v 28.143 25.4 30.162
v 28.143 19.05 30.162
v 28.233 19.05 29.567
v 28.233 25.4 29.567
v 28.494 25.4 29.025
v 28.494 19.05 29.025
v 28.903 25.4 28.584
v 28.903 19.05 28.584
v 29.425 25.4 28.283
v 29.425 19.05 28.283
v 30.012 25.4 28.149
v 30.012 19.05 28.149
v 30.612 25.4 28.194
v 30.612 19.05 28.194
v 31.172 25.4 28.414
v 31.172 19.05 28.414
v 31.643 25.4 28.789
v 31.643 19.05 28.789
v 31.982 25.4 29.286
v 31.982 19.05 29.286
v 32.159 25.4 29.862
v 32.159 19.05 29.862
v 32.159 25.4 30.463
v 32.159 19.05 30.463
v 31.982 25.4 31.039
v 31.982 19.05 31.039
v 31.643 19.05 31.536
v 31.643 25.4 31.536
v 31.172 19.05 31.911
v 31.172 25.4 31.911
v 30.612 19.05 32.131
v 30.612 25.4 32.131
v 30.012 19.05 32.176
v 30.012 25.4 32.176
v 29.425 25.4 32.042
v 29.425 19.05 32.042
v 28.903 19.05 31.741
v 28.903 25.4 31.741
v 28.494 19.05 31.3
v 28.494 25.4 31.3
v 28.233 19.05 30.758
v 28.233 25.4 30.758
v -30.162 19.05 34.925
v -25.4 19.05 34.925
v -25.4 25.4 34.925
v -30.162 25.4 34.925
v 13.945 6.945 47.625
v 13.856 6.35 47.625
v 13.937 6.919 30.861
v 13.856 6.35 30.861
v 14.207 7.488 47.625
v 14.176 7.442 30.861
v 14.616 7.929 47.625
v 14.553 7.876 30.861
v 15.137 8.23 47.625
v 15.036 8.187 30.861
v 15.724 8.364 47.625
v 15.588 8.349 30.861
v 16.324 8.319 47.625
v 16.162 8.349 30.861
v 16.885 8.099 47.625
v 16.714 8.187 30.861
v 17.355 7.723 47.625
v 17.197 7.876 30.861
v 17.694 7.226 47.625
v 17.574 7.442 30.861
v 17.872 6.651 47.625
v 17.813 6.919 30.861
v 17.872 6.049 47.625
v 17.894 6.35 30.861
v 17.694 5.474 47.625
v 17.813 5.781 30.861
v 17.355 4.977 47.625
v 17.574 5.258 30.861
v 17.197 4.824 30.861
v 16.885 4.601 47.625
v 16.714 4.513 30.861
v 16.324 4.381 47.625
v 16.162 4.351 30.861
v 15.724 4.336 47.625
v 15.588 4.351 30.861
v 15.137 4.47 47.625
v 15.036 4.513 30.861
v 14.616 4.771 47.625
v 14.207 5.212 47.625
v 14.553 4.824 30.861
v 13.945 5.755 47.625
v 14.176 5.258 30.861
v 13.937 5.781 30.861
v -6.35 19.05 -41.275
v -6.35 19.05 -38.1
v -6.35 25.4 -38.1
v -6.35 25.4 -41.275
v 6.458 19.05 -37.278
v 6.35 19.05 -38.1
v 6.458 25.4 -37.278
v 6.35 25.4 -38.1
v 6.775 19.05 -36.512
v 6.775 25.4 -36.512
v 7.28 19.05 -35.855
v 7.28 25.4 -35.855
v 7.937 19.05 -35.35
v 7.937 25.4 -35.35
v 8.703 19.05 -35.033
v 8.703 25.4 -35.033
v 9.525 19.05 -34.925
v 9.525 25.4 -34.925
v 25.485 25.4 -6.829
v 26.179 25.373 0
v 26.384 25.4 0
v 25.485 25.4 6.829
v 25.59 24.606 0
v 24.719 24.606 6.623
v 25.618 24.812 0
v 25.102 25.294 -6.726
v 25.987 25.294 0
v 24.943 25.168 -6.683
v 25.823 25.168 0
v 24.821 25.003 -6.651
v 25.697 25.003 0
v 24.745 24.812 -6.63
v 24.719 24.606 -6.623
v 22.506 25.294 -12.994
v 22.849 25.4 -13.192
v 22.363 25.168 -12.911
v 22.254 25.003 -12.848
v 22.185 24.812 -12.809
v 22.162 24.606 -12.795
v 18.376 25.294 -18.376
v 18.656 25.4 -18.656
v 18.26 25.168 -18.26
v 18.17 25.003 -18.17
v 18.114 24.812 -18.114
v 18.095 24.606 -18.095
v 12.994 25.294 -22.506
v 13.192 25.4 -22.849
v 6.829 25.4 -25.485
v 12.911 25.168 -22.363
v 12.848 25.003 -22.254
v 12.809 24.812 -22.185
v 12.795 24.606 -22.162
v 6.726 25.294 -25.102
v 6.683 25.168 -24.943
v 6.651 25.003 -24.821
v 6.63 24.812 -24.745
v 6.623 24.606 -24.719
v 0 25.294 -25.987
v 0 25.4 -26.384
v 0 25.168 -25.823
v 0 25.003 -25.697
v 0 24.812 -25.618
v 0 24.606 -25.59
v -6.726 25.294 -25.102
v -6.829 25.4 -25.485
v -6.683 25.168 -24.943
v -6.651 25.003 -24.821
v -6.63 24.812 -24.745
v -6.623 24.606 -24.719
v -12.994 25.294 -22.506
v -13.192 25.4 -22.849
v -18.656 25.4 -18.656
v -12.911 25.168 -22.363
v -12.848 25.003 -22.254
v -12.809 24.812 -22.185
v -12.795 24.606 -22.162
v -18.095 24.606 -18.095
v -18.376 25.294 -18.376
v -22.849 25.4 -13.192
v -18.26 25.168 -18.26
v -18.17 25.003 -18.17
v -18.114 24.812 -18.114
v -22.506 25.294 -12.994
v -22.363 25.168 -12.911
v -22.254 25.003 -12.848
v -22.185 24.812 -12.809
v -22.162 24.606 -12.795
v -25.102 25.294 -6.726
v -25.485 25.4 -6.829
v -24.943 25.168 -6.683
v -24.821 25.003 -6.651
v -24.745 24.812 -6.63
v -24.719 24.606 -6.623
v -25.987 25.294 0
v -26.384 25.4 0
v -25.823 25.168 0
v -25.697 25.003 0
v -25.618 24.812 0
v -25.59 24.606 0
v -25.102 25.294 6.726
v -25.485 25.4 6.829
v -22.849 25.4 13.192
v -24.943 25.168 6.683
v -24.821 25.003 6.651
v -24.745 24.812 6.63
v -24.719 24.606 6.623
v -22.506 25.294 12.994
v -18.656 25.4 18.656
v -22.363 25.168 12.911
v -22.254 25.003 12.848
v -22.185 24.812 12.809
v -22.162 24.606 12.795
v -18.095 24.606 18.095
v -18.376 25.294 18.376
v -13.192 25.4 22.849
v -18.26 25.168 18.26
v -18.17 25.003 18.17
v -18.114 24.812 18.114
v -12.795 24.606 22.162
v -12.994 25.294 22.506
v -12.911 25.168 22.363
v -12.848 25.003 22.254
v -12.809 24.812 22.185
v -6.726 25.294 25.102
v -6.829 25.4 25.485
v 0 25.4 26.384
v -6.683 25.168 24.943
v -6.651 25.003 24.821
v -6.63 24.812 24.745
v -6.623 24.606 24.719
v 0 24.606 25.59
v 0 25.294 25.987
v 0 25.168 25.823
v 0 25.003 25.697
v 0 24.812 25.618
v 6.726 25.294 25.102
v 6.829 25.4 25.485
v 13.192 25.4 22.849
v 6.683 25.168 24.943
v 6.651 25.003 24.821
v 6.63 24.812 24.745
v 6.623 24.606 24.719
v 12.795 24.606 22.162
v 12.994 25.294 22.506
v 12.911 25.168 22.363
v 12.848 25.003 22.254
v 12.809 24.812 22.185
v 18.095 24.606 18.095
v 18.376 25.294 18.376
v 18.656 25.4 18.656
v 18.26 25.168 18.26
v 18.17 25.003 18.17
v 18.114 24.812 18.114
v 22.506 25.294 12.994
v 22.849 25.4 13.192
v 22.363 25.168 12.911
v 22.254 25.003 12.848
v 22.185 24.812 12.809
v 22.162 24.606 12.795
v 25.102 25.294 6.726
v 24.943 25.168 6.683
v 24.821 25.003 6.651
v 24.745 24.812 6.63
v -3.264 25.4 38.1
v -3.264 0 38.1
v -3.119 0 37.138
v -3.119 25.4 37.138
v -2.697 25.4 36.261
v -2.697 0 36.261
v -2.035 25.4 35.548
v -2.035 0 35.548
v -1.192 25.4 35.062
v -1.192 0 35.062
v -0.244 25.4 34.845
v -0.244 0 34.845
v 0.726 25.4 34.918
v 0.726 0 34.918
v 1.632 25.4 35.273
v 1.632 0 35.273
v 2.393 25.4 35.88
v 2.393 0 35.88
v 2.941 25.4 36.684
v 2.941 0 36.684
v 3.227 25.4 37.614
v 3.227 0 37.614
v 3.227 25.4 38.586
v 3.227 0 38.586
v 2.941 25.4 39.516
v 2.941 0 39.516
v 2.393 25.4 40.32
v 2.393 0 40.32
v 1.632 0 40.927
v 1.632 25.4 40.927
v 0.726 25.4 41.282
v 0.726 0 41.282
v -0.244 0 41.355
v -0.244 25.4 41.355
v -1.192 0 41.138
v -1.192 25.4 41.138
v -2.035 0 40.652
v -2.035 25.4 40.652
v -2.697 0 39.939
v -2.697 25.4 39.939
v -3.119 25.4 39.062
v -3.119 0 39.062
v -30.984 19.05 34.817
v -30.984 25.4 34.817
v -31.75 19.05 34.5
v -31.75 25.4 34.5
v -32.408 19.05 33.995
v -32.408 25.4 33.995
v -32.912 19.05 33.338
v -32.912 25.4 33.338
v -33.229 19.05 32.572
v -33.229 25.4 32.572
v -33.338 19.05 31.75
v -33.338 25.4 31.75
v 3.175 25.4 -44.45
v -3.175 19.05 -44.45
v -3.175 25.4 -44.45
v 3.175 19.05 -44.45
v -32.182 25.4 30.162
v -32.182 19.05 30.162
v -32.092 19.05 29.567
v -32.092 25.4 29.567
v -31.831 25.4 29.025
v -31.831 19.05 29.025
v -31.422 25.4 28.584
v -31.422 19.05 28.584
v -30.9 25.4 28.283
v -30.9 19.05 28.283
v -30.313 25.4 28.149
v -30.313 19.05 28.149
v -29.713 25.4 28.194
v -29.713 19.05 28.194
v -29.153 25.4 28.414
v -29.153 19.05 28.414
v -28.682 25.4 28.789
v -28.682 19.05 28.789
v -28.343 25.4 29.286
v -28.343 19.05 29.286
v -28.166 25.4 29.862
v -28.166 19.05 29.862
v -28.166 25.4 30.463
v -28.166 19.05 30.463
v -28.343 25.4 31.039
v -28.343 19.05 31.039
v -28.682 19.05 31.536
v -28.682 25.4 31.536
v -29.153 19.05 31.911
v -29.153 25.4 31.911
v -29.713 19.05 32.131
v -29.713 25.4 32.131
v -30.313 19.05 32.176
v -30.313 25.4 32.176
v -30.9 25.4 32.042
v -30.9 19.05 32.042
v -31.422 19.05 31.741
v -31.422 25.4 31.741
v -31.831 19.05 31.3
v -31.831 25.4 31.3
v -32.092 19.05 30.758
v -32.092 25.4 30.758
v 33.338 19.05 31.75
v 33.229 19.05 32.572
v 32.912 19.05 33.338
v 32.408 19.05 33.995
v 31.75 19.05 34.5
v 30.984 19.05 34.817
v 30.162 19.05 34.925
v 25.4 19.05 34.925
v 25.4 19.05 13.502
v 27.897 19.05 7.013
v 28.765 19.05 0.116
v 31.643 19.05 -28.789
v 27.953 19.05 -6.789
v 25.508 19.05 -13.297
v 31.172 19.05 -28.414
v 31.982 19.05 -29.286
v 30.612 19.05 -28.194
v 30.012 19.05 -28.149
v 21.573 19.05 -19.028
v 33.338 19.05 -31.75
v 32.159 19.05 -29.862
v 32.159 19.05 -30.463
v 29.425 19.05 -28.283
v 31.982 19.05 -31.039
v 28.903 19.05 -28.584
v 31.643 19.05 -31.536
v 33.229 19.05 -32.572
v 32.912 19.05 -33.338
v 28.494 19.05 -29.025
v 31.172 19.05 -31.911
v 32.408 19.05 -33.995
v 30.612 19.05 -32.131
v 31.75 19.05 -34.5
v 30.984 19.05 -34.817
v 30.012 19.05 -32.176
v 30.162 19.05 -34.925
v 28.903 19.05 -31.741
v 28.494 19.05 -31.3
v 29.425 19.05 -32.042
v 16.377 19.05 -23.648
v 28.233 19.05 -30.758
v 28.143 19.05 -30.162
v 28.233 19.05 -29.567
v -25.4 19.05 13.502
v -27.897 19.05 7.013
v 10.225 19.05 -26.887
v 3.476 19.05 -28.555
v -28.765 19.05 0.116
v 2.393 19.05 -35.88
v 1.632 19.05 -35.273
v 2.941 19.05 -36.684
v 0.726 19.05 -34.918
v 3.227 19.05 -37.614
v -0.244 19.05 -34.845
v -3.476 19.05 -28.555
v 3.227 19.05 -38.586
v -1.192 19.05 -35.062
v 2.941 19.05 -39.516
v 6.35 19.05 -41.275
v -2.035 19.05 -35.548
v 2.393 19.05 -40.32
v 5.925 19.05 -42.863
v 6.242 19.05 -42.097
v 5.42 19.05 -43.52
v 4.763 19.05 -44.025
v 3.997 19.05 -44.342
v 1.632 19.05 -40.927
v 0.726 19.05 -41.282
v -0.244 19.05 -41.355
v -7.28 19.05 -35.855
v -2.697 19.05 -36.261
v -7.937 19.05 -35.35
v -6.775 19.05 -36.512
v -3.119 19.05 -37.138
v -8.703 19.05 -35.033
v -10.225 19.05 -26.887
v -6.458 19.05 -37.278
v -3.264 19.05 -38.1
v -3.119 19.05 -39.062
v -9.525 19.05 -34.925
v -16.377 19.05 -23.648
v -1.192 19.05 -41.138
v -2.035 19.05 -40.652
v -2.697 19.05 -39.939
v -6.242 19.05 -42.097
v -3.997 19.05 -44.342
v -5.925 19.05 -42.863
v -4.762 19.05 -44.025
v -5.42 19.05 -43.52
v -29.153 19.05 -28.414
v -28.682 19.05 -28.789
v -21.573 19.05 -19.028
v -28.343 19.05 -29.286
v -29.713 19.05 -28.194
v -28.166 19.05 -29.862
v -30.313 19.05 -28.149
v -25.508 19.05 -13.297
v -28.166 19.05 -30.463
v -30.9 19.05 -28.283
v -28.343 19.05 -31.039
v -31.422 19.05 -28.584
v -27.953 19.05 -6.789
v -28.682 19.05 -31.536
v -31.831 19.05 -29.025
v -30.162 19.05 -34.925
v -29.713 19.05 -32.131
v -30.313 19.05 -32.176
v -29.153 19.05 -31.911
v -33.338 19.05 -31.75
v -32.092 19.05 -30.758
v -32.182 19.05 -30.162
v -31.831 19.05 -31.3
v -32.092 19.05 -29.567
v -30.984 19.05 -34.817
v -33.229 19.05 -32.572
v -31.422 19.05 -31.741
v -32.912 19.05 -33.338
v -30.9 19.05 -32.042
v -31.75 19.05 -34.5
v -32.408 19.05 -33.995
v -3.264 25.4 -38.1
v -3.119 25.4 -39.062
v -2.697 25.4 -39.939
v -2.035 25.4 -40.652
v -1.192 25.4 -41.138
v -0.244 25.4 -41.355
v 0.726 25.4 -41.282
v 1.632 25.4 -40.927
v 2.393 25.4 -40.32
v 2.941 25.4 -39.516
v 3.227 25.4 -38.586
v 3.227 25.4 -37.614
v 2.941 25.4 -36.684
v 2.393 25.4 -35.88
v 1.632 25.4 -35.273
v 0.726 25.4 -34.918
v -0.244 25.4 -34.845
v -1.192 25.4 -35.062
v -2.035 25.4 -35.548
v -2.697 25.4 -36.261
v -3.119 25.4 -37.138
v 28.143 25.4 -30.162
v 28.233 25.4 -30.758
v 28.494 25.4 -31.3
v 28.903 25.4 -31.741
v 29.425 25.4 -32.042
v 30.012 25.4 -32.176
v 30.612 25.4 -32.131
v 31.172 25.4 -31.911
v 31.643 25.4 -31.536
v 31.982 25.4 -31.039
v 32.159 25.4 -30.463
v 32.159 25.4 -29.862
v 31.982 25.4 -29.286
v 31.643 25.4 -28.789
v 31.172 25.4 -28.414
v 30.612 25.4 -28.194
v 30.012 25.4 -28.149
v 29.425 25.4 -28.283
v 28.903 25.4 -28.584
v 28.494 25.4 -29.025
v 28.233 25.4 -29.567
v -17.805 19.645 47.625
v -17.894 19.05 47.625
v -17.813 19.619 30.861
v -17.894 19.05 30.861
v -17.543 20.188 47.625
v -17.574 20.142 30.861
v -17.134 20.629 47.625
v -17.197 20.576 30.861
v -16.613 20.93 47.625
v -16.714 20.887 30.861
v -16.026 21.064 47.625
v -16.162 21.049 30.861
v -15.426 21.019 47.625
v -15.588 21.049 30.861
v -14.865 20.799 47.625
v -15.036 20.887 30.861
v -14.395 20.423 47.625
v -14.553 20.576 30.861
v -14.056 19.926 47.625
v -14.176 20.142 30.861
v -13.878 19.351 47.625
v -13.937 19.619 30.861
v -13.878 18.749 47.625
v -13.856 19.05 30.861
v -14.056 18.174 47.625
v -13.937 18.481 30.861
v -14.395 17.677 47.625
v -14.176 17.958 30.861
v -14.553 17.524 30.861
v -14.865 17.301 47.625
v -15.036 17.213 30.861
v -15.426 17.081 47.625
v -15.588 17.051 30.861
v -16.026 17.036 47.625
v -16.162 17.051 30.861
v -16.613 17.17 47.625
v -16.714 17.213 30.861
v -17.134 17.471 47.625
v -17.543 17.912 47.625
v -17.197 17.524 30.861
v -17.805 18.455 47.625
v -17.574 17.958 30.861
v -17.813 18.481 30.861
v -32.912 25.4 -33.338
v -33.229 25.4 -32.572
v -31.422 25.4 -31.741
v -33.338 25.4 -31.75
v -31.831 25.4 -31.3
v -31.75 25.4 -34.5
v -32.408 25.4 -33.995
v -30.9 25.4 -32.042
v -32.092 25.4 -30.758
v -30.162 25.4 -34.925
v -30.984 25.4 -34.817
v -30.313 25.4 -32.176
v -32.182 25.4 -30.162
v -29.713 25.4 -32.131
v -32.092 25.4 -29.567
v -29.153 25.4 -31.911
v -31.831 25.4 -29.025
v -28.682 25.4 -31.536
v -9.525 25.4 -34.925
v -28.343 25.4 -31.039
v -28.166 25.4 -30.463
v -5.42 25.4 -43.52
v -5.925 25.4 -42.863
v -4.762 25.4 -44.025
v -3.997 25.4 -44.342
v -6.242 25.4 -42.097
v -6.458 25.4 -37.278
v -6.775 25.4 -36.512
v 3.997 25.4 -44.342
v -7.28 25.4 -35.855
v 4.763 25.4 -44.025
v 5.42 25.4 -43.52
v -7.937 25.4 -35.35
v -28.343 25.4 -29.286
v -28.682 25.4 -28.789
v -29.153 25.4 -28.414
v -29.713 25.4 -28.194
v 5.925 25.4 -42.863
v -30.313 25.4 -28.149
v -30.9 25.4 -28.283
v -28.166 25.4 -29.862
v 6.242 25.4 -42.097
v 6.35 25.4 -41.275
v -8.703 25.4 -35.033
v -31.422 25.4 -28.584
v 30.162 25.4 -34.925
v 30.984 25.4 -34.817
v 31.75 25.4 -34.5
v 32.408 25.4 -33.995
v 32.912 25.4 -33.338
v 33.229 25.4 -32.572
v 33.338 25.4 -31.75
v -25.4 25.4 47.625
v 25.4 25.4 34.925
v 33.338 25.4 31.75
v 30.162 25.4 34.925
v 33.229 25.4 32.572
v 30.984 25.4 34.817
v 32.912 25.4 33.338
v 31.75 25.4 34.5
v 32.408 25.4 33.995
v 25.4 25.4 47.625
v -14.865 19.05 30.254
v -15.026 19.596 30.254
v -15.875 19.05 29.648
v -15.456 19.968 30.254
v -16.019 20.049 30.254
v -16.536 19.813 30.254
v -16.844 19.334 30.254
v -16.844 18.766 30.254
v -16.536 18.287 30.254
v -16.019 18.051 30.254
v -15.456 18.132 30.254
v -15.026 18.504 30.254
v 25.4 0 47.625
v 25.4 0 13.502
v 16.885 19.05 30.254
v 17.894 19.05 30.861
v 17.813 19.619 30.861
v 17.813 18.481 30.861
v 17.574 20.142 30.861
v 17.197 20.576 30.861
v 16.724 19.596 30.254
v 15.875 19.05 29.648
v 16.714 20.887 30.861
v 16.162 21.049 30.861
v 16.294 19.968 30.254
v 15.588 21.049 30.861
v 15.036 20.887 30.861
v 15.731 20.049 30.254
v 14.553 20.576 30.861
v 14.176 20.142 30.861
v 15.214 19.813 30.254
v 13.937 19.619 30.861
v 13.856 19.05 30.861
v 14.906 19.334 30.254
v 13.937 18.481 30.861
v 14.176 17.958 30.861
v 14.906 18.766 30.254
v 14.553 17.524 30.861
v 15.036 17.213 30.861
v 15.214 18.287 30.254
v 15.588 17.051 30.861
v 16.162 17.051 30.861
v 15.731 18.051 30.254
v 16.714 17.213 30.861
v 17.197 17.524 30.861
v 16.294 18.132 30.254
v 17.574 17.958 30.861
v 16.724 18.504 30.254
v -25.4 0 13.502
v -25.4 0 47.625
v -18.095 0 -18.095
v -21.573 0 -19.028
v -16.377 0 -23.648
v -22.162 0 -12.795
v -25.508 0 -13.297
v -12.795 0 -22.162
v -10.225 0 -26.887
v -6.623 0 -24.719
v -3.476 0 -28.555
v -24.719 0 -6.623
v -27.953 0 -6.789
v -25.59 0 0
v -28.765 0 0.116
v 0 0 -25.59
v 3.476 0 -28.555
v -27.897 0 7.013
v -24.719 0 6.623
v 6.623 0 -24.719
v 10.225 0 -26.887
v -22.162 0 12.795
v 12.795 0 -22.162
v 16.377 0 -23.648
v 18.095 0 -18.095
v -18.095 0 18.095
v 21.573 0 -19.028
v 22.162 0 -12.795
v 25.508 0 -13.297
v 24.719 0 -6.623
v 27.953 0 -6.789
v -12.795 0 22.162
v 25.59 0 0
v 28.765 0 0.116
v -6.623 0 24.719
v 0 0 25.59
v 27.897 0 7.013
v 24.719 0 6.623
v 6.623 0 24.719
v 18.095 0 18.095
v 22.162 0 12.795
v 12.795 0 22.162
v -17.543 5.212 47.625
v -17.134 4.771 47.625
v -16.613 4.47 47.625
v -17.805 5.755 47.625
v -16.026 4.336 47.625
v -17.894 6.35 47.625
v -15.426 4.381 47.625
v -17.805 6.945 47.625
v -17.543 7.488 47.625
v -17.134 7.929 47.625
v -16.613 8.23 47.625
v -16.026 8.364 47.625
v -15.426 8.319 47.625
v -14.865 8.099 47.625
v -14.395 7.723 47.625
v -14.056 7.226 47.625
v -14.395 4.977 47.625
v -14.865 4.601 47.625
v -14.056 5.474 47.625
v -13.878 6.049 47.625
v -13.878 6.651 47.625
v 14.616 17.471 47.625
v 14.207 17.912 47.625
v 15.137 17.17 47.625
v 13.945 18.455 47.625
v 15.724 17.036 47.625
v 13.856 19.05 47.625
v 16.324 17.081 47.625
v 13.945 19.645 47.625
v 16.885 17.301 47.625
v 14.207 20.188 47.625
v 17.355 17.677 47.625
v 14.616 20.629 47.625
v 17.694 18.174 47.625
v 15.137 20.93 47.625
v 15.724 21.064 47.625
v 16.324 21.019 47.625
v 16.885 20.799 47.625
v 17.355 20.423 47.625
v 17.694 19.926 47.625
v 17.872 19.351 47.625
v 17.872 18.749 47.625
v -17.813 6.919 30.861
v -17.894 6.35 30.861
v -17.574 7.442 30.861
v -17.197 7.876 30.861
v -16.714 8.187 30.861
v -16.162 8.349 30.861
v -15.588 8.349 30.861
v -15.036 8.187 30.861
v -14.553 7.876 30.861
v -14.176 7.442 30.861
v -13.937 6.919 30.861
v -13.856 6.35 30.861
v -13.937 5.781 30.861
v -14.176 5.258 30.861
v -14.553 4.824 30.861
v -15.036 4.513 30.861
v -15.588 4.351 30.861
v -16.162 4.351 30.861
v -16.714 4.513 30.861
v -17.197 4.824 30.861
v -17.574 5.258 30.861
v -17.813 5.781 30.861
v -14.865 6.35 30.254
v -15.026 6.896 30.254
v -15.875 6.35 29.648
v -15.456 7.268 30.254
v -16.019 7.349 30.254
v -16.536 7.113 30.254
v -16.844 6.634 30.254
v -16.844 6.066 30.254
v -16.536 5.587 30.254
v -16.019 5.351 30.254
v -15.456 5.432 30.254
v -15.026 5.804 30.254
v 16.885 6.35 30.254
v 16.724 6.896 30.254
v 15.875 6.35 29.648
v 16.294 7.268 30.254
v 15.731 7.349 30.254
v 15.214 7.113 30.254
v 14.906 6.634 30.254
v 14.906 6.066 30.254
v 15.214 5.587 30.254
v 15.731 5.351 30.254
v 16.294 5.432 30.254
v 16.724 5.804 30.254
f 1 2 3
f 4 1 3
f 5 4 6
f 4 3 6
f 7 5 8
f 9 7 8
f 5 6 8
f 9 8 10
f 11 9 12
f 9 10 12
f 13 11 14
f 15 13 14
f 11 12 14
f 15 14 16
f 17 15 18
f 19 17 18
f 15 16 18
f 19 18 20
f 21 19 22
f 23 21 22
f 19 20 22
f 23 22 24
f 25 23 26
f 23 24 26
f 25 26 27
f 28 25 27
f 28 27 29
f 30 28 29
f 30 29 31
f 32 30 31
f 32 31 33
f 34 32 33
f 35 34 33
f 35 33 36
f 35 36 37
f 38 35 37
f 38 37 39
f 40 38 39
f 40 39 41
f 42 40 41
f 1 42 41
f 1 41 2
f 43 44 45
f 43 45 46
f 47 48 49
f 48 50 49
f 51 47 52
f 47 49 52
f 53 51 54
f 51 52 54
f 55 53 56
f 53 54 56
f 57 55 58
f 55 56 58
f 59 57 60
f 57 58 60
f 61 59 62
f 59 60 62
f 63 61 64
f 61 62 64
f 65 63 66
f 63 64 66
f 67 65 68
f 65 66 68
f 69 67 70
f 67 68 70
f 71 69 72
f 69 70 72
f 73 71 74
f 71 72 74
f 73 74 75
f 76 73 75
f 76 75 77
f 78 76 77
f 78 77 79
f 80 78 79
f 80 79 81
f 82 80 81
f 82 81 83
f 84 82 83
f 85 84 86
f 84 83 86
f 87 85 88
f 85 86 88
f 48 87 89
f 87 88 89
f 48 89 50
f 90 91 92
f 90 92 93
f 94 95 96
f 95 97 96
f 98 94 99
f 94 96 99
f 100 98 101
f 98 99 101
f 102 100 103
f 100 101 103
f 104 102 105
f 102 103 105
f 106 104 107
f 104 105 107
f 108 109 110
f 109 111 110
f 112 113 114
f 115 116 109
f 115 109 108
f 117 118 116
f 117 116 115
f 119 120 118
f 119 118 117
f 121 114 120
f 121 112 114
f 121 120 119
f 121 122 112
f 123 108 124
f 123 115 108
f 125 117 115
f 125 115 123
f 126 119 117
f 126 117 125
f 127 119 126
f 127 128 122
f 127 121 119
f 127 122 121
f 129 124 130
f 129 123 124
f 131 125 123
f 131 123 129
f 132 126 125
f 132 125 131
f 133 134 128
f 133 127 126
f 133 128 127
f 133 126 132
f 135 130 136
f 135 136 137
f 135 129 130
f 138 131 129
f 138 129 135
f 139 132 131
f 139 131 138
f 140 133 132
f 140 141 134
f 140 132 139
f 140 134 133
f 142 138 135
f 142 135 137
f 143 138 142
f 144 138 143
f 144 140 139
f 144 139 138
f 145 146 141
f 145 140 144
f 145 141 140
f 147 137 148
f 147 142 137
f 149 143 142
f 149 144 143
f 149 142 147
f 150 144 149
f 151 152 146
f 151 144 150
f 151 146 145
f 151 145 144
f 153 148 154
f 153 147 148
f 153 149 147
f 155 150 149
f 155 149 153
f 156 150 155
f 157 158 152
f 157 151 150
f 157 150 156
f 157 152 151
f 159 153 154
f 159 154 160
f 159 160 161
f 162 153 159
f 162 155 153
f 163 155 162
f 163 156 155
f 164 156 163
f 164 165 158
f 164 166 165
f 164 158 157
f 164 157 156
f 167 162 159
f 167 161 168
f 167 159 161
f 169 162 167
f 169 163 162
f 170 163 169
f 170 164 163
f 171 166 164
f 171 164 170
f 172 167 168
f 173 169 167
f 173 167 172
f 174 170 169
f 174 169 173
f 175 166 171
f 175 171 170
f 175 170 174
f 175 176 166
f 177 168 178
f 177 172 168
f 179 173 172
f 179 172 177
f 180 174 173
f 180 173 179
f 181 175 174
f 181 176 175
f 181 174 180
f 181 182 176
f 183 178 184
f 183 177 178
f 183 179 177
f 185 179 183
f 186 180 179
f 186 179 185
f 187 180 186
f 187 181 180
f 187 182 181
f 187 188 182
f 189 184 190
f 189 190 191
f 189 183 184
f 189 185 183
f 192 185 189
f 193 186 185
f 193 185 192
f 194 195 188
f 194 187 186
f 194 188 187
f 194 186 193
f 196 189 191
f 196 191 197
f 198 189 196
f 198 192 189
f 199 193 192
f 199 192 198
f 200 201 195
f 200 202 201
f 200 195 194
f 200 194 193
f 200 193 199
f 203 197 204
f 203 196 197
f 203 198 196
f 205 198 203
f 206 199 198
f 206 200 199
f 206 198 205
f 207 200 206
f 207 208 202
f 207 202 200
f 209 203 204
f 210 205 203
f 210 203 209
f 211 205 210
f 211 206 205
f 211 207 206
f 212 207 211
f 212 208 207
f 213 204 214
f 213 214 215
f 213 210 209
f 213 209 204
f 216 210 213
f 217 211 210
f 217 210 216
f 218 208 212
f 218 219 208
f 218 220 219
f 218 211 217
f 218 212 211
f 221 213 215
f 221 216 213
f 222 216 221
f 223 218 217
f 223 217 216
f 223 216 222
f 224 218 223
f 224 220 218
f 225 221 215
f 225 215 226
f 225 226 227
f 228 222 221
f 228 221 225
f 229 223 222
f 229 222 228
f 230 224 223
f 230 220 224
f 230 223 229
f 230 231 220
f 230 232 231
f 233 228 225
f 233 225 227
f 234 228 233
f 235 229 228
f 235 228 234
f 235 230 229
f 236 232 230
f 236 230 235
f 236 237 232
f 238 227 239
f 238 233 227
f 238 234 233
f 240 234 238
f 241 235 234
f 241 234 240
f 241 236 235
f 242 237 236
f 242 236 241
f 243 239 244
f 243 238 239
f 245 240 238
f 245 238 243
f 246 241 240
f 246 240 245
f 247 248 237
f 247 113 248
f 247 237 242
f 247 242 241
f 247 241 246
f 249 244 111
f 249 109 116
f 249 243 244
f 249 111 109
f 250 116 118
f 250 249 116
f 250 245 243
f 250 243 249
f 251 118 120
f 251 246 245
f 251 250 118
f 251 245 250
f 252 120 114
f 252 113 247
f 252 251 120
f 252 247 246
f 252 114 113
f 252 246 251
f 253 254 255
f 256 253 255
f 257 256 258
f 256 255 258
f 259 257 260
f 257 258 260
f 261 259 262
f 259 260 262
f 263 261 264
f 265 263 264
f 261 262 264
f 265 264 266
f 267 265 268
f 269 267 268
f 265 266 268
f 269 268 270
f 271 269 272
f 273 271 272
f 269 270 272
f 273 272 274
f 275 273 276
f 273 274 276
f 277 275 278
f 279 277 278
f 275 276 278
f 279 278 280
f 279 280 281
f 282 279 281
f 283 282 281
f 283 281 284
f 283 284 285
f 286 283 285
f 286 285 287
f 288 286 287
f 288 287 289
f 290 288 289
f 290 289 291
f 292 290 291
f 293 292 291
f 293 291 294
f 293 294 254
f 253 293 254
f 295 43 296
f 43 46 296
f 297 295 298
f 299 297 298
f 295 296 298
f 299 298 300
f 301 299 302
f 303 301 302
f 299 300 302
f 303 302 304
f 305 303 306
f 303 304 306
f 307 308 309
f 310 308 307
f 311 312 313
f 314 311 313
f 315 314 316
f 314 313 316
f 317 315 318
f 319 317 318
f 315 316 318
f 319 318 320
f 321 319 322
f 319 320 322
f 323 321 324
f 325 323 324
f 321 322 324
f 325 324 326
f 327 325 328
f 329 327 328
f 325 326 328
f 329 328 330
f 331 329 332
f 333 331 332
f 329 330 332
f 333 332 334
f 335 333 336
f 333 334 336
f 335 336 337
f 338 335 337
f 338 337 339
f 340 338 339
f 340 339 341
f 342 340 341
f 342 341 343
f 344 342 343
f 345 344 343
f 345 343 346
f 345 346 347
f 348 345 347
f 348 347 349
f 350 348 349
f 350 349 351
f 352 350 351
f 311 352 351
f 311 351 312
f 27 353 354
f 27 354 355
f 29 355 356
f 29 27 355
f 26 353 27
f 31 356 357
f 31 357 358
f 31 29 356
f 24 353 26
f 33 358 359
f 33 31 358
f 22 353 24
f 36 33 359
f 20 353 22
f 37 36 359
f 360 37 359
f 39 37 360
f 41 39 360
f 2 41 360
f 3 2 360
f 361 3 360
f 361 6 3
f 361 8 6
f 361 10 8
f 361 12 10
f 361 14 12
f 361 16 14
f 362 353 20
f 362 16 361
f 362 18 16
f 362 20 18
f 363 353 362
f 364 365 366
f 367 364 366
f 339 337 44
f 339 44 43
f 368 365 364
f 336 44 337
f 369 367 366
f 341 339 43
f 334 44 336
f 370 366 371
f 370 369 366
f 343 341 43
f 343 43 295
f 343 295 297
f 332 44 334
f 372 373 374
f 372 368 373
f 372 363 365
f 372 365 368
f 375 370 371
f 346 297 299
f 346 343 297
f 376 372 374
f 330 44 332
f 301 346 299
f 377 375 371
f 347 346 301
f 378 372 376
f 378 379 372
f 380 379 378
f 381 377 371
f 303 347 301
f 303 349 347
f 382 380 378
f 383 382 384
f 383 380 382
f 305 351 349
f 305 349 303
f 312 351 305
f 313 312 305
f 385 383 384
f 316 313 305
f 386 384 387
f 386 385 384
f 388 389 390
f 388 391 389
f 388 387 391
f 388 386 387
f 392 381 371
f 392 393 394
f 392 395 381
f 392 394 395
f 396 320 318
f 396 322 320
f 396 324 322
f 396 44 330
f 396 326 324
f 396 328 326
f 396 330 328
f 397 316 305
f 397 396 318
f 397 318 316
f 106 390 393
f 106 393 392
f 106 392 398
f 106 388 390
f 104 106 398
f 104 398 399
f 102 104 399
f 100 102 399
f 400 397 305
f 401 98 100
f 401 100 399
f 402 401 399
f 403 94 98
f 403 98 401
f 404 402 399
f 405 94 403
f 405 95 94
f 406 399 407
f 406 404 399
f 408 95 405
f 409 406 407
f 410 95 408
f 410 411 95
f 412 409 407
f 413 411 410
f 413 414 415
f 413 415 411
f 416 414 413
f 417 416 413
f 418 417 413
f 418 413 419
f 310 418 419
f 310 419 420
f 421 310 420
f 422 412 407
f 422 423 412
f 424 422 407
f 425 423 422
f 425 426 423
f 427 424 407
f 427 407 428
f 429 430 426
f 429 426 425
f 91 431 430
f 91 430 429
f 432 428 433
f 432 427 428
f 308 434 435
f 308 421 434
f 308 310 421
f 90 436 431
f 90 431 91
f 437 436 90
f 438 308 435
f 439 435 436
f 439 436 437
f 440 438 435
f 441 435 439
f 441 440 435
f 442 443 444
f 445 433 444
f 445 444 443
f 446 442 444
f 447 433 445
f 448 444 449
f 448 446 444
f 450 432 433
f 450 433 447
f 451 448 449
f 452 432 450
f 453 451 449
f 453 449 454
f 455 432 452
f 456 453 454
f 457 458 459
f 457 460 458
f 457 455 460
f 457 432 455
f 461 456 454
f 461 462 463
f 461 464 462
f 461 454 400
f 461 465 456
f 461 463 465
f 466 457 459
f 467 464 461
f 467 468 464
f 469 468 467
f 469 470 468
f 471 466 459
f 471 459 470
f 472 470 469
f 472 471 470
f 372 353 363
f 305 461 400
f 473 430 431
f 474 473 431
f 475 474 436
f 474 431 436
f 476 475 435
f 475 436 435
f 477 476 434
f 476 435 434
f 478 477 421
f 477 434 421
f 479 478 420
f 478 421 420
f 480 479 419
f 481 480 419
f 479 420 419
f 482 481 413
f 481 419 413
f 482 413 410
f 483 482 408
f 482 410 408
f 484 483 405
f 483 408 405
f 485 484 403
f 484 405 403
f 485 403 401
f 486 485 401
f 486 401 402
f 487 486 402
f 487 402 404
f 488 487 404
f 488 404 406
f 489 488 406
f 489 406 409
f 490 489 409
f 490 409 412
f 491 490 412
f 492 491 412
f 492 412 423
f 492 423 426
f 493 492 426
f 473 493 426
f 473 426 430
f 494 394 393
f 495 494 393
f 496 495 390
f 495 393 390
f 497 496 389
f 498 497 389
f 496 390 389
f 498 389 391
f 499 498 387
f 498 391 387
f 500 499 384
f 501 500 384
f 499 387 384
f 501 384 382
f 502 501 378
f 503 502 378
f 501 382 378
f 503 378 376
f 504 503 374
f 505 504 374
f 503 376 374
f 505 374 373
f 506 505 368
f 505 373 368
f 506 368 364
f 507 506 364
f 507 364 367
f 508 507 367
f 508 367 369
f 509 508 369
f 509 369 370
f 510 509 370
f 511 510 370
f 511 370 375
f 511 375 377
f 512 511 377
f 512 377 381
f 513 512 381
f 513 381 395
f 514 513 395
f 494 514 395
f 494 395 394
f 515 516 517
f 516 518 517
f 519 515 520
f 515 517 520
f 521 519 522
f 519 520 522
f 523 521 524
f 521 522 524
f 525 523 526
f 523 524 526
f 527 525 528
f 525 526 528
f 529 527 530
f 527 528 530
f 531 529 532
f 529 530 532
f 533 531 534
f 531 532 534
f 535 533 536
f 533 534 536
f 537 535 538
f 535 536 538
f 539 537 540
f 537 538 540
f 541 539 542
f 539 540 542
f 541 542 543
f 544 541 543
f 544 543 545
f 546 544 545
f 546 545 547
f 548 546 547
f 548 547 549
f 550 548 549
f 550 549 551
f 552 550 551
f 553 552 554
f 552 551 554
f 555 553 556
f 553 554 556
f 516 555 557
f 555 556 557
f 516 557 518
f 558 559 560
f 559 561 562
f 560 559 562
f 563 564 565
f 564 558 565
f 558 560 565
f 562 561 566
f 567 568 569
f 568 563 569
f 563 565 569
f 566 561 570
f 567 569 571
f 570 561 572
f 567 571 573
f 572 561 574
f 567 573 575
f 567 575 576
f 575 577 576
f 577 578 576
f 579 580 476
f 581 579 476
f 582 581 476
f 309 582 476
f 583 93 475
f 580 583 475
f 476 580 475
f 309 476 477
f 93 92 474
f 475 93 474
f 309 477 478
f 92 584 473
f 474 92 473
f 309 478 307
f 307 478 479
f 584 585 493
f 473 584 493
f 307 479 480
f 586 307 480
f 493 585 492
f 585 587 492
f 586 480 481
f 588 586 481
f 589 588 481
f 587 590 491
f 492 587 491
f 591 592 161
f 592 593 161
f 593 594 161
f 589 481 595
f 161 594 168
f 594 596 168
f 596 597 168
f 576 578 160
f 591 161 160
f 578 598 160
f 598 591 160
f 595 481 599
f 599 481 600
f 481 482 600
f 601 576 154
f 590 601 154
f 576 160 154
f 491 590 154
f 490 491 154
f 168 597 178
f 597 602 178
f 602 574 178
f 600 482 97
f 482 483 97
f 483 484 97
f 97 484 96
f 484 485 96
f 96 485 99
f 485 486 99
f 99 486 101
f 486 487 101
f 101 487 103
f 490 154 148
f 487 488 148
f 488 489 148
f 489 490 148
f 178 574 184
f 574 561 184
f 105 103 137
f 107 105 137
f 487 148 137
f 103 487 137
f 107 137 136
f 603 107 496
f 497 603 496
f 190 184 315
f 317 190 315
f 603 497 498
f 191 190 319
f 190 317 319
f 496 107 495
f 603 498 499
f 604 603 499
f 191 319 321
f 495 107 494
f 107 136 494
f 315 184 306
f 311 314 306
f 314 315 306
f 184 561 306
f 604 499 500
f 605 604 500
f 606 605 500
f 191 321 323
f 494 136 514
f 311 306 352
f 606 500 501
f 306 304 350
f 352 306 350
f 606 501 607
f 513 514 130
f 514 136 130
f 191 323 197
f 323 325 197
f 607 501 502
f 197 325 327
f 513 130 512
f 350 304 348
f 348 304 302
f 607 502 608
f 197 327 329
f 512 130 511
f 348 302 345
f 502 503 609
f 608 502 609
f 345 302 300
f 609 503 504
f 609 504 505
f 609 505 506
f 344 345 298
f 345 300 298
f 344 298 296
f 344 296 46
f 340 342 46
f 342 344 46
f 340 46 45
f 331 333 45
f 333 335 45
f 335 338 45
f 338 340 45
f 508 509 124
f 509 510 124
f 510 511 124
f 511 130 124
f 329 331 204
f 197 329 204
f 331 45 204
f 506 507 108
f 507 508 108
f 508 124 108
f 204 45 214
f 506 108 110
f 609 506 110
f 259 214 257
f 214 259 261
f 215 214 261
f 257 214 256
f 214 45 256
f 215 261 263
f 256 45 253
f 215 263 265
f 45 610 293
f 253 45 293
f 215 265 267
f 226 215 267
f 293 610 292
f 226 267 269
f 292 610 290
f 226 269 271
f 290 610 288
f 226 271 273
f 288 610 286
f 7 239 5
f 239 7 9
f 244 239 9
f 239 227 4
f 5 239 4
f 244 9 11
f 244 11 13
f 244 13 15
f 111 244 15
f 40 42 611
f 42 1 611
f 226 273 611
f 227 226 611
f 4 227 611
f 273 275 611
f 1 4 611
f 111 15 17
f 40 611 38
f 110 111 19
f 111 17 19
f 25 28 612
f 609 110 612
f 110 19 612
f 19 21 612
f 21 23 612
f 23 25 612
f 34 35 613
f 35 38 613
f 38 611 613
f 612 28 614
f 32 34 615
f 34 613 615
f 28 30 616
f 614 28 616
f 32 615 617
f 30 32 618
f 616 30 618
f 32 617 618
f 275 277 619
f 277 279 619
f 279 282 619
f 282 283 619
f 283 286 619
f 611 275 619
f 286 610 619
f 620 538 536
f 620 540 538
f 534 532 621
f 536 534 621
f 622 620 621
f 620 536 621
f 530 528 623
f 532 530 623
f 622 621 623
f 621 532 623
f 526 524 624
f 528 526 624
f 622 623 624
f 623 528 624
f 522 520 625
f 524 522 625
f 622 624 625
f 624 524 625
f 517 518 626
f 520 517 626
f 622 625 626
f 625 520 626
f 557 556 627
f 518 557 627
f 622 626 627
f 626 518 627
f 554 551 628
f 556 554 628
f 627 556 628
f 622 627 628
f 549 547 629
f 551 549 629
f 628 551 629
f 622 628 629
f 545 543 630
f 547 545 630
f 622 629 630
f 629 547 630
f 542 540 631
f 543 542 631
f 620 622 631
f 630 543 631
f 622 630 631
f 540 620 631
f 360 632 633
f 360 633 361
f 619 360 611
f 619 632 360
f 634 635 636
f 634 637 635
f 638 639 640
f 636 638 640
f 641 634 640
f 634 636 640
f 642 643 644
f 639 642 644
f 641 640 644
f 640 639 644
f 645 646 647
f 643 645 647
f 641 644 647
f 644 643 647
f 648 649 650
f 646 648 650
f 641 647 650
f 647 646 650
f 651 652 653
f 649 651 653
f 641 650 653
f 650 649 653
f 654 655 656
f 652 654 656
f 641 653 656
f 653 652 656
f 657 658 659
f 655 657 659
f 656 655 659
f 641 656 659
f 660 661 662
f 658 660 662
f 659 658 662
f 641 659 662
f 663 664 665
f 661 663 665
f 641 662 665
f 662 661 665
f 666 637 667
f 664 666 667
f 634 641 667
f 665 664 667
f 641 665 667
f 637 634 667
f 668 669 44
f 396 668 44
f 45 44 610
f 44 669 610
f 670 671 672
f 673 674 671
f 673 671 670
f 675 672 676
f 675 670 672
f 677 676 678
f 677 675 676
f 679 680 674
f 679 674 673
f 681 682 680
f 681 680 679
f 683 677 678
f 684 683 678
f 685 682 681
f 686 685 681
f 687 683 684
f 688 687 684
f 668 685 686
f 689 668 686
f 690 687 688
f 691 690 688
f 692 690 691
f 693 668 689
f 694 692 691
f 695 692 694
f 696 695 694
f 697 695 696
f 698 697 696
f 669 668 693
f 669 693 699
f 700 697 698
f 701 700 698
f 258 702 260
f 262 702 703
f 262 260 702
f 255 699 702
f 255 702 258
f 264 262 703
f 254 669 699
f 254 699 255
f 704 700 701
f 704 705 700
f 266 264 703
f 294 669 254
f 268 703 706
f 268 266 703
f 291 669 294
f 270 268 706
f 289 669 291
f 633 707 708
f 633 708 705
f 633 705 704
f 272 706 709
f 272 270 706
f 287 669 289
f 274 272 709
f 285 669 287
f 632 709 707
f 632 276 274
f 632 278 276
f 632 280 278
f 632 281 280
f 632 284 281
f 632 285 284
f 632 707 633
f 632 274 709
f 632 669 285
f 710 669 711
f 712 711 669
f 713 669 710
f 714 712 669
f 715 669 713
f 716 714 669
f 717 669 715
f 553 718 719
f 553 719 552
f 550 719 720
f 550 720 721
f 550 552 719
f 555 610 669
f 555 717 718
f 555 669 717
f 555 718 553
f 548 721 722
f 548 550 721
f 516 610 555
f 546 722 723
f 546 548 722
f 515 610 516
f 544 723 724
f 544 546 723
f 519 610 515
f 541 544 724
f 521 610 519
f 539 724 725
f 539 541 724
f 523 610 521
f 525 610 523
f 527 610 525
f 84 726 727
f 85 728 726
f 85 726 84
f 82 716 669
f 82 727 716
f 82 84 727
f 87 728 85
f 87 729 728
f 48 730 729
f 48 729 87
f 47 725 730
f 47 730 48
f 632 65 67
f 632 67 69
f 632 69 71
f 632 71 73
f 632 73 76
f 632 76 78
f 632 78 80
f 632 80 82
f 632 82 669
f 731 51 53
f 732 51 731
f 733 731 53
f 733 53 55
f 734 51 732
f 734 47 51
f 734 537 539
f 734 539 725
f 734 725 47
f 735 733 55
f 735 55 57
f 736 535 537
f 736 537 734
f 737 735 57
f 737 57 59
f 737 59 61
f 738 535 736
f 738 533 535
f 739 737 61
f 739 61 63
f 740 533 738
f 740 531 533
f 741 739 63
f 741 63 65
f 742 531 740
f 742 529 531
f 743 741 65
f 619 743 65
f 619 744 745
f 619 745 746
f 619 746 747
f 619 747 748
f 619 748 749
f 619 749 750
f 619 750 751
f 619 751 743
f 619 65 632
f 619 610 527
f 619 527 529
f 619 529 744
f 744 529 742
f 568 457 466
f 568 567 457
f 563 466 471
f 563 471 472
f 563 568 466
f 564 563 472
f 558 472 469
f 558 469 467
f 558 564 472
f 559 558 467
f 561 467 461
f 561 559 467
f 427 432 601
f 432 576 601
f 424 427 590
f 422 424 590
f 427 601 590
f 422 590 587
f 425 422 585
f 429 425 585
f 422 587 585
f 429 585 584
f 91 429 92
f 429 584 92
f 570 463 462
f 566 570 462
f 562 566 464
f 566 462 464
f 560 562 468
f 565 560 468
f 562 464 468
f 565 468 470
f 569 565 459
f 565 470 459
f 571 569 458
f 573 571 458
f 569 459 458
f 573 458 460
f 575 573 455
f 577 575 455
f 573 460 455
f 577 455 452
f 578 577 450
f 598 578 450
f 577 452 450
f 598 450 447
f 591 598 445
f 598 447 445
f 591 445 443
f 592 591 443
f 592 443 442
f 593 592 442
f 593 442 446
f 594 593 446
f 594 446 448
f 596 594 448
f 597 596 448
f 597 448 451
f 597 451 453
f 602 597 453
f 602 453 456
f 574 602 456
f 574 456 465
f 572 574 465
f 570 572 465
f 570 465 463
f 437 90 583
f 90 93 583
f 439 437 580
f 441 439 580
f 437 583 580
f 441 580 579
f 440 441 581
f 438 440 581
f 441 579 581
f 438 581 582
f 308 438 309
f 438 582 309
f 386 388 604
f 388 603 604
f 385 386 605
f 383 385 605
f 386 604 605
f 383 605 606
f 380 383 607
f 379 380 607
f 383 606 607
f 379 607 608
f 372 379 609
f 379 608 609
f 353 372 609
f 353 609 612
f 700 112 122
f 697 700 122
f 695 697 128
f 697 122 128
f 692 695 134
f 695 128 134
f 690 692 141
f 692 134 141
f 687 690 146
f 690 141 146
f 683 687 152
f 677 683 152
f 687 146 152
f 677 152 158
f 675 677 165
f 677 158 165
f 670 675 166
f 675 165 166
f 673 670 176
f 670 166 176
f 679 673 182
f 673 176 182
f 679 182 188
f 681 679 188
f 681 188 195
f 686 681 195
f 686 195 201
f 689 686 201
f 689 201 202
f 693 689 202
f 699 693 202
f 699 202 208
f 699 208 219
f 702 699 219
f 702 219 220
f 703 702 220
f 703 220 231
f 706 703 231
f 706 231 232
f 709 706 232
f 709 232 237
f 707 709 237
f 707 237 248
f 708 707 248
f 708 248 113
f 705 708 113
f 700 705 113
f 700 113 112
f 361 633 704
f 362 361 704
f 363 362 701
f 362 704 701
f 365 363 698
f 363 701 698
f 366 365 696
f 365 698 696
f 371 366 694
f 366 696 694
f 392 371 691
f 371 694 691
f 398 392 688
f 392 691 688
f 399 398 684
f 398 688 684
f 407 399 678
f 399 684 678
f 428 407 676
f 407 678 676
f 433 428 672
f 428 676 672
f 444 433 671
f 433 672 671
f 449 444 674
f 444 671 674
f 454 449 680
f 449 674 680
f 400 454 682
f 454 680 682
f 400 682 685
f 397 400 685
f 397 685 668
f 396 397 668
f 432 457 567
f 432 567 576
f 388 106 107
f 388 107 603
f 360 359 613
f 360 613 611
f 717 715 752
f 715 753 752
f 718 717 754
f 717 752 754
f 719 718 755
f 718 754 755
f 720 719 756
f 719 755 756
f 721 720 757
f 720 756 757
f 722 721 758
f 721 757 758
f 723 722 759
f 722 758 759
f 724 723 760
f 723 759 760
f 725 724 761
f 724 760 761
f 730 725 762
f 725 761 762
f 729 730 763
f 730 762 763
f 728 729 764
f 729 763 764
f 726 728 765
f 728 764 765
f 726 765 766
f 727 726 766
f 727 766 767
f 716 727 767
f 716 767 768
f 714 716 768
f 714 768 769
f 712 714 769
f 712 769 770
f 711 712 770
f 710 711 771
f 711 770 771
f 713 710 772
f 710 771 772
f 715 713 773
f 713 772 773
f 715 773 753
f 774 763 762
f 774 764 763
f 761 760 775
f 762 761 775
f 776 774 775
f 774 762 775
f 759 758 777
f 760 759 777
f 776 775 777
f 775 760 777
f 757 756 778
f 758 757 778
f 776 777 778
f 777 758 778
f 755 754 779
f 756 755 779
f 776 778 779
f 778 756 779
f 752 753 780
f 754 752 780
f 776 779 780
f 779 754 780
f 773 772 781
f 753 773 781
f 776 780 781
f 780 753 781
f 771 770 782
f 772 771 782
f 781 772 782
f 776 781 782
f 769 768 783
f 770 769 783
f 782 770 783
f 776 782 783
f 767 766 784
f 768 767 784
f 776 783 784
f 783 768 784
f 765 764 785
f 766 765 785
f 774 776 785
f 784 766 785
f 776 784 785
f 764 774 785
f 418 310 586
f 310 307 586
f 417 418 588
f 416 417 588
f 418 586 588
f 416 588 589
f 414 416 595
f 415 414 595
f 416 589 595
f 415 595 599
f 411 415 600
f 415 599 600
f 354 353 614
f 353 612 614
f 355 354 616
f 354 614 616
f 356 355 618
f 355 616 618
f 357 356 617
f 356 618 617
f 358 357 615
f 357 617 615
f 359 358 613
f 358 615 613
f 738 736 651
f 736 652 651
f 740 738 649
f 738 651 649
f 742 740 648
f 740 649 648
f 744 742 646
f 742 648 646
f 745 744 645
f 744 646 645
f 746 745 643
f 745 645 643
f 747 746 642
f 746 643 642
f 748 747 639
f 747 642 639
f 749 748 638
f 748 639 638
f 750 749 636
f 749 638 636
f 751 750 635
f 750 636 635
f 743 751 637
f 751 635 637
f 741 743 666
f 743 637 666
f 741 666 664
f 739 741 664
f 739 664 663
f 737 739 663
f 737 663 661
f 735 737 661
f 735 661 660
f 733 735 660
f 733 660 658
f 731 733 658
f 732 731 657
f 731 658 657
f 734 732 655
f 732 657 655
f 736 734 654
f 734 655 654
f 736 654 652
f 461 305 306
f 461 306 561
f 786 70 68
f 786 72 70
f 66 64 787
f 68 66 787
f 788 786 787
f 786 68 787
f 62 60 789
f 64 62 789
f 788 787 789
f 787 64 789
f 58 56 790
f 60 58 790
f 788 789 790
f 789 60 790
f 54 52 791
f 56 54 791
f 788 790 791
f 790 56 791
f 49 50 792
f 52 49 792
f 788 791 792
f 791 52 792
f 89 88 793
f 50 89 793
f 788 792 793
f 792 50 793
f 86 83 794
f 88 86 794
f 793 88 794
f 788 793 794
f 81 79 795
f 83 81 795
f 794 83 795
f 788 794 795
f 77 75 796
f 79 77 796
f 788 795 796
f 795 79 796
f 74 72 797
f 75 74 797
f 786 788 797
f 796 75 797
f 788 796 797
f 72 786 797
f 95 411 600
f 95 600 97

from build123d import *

# Parameters (mm, degrees)
SKETCH1_R                  = 28.7655
BOSS_EXTRUDE1_DEPTH        = 19.05
BOSS_EXTRUDE2_DEPTH        = 6.35
FILLET1_R                  = 3.175
SKETCH8_W                  = 50.8
SKETCH8_H                  = 25.4
BOSS_EXTRUDE4_DEPTH        = 38.1
SKETCH5_R                  = 25.5905
CUT_EXTRUDE1_DEPTH         = 26.4
FILLET2_R                  = 0.79375
F_10_32_TAPPED_HOLE1_D     = 4.0386
F_10_32_TAPPED_HOLE1_DEPTH = 6.35
F_0_257_DIAMETER_HOLE1_D   = 6.5278
F_10_32_TAPPED_HOLE2_D     = 4.0386
F_10_32_TAPPED_HOLE2_DEPTH = 16.764
F_10_32_TAPPED_HOLE2_TIP   = 1.213317848


with BuildPart() as part:
    # Sketch1 → Boss-Extrude1 (new body)
    with BuildSketch(Plane(origin=(0, 0, 0), x_dir=(1, 0, 0), z_dir=(0, 1, 0))):
        Circle(SKETCH1_R)
    extrude(amount=BOSS_EXTRUDE1_DEPTH)



with BuildPart() as body_2:
    # Sketch4 → Boss-Extrude2 (new body)
    with BuildSketch(Plane(origin=(0, 19.05, 0), x_dir=(1, 0, 0), z_dir=(0, 1, 0))):
        Polygon((-33.3375, 34.925), (-6.35, 34.925), (-6.35, 44.45), (6.35, 44.45), (6.35, 34.925), (33.3375, 34.925), (33.3375, -34.925), (-33.3375, -34.925), align=None)
    extrude(amount=BOSS_EXTRUDE2_DEPTH)

    # Fillet1
    fillet1_edges = [body_2.edges().sort_by_distance(p)[0] for p in [
        (33.3375, 22.225, 34.925),
        (-33.3375, 22.225, 34.925),
        (-33.3375, 22.225, -34.925),
        (-6.35, 22.225, -34.925),
        (-6.35, 22.225, -44.45),
        (6.35, 22.225, -44.45),
        (6.35, 22.225, -34.925),
        (33.3375, 22.225, -34.925),
    ]]
    fillet(fillet1_edges, radius=FILLET1_R)


with BuildPart() as part_1:
    add(part.part)

    add(body_2.part)  # Boss-Extrude4 merges body 2
    # Sketch8 → Boss-Extrude4 (add)
    with BuildSketch(Plane.XY.offset(47.625)):
        with Locations((0, 12.7)):
            Rectangle(SKETCH8_W, SKETCH8_H)
    extrude(amount=-BOSS_EXTRUDE4_DEPTH)

    # Sketch5 → Cut-Extrude1 (cut, through all)
    with BuildSketch(Plane(origin=(0, 25.4, 0), x_dir=(1, 0, 0), z_dir=(0, 1, 0))):
        Circle(SKETCH5_R)
    extrude(amount=-CUT_EXTRUDE1_DEPTH, mode=Mode.SUBTRACT)

    # Fillet2
    fillet2_edges = [part_1.edges().sort_by_distance(p)[0] for p in [
        (-25.5905, 25.4, 0),
    ]]
    fillet(fillet2_edges, radius=FILLET2_R)

    # #10-32 Tapped Hole1
    with Locations(Plane(origin=(0, 25.4, 0), x_dir=(1, 0, 0), z_dir=(0, 1, 0))):
        with Locations((-30.1625, 30.1625), (30.1625, 30.1625), (30.1625, -30.1625), (-30.1625, -30.1625)):
            Hole(F_10_32_TAPPED_HOLE1_D / 2, depth=F_10_32_TAPPED_HOLE1_DEPTH)

    # F (0.257) Diameter Hole1 (through all)
    with Locations(Plane(origin=(0, 25.4, 0), x_dir=(1, 0, 0), z_dir=(0, 1, 0))):
        with Locations((0, 38.1), (0, -38.1)):
            Hole(F_0_257_DIAMETER_HOLE1_D / 2)

    # #10-32 Tapped Hole2
    with Locations(Plane.XY.offset(47.625)):
        with Locations((-15.875, 19.05), (-15.875, 6.35), (15.875, 6.35), (15.875, 19.05)):
            Hole(F_10_32_TAPPED_HOLE2_D / 2, depth=F_10_32_TAPPED_HOLE2_DEPTH)
            with Locations((0, 0, -(F_10_32_TAPPED_HOLE2_DEPTH + F_10_32_TAPPED_HOLE2_TIP / 2))):  # 118° drill point
                Cone(0, F_10_32_TAPPED_HOLE2_D / 2, F_10_32_TAPPED_HOLE2_TIP, mode=Mode.SUBTRACT)


solid = part_1.part
